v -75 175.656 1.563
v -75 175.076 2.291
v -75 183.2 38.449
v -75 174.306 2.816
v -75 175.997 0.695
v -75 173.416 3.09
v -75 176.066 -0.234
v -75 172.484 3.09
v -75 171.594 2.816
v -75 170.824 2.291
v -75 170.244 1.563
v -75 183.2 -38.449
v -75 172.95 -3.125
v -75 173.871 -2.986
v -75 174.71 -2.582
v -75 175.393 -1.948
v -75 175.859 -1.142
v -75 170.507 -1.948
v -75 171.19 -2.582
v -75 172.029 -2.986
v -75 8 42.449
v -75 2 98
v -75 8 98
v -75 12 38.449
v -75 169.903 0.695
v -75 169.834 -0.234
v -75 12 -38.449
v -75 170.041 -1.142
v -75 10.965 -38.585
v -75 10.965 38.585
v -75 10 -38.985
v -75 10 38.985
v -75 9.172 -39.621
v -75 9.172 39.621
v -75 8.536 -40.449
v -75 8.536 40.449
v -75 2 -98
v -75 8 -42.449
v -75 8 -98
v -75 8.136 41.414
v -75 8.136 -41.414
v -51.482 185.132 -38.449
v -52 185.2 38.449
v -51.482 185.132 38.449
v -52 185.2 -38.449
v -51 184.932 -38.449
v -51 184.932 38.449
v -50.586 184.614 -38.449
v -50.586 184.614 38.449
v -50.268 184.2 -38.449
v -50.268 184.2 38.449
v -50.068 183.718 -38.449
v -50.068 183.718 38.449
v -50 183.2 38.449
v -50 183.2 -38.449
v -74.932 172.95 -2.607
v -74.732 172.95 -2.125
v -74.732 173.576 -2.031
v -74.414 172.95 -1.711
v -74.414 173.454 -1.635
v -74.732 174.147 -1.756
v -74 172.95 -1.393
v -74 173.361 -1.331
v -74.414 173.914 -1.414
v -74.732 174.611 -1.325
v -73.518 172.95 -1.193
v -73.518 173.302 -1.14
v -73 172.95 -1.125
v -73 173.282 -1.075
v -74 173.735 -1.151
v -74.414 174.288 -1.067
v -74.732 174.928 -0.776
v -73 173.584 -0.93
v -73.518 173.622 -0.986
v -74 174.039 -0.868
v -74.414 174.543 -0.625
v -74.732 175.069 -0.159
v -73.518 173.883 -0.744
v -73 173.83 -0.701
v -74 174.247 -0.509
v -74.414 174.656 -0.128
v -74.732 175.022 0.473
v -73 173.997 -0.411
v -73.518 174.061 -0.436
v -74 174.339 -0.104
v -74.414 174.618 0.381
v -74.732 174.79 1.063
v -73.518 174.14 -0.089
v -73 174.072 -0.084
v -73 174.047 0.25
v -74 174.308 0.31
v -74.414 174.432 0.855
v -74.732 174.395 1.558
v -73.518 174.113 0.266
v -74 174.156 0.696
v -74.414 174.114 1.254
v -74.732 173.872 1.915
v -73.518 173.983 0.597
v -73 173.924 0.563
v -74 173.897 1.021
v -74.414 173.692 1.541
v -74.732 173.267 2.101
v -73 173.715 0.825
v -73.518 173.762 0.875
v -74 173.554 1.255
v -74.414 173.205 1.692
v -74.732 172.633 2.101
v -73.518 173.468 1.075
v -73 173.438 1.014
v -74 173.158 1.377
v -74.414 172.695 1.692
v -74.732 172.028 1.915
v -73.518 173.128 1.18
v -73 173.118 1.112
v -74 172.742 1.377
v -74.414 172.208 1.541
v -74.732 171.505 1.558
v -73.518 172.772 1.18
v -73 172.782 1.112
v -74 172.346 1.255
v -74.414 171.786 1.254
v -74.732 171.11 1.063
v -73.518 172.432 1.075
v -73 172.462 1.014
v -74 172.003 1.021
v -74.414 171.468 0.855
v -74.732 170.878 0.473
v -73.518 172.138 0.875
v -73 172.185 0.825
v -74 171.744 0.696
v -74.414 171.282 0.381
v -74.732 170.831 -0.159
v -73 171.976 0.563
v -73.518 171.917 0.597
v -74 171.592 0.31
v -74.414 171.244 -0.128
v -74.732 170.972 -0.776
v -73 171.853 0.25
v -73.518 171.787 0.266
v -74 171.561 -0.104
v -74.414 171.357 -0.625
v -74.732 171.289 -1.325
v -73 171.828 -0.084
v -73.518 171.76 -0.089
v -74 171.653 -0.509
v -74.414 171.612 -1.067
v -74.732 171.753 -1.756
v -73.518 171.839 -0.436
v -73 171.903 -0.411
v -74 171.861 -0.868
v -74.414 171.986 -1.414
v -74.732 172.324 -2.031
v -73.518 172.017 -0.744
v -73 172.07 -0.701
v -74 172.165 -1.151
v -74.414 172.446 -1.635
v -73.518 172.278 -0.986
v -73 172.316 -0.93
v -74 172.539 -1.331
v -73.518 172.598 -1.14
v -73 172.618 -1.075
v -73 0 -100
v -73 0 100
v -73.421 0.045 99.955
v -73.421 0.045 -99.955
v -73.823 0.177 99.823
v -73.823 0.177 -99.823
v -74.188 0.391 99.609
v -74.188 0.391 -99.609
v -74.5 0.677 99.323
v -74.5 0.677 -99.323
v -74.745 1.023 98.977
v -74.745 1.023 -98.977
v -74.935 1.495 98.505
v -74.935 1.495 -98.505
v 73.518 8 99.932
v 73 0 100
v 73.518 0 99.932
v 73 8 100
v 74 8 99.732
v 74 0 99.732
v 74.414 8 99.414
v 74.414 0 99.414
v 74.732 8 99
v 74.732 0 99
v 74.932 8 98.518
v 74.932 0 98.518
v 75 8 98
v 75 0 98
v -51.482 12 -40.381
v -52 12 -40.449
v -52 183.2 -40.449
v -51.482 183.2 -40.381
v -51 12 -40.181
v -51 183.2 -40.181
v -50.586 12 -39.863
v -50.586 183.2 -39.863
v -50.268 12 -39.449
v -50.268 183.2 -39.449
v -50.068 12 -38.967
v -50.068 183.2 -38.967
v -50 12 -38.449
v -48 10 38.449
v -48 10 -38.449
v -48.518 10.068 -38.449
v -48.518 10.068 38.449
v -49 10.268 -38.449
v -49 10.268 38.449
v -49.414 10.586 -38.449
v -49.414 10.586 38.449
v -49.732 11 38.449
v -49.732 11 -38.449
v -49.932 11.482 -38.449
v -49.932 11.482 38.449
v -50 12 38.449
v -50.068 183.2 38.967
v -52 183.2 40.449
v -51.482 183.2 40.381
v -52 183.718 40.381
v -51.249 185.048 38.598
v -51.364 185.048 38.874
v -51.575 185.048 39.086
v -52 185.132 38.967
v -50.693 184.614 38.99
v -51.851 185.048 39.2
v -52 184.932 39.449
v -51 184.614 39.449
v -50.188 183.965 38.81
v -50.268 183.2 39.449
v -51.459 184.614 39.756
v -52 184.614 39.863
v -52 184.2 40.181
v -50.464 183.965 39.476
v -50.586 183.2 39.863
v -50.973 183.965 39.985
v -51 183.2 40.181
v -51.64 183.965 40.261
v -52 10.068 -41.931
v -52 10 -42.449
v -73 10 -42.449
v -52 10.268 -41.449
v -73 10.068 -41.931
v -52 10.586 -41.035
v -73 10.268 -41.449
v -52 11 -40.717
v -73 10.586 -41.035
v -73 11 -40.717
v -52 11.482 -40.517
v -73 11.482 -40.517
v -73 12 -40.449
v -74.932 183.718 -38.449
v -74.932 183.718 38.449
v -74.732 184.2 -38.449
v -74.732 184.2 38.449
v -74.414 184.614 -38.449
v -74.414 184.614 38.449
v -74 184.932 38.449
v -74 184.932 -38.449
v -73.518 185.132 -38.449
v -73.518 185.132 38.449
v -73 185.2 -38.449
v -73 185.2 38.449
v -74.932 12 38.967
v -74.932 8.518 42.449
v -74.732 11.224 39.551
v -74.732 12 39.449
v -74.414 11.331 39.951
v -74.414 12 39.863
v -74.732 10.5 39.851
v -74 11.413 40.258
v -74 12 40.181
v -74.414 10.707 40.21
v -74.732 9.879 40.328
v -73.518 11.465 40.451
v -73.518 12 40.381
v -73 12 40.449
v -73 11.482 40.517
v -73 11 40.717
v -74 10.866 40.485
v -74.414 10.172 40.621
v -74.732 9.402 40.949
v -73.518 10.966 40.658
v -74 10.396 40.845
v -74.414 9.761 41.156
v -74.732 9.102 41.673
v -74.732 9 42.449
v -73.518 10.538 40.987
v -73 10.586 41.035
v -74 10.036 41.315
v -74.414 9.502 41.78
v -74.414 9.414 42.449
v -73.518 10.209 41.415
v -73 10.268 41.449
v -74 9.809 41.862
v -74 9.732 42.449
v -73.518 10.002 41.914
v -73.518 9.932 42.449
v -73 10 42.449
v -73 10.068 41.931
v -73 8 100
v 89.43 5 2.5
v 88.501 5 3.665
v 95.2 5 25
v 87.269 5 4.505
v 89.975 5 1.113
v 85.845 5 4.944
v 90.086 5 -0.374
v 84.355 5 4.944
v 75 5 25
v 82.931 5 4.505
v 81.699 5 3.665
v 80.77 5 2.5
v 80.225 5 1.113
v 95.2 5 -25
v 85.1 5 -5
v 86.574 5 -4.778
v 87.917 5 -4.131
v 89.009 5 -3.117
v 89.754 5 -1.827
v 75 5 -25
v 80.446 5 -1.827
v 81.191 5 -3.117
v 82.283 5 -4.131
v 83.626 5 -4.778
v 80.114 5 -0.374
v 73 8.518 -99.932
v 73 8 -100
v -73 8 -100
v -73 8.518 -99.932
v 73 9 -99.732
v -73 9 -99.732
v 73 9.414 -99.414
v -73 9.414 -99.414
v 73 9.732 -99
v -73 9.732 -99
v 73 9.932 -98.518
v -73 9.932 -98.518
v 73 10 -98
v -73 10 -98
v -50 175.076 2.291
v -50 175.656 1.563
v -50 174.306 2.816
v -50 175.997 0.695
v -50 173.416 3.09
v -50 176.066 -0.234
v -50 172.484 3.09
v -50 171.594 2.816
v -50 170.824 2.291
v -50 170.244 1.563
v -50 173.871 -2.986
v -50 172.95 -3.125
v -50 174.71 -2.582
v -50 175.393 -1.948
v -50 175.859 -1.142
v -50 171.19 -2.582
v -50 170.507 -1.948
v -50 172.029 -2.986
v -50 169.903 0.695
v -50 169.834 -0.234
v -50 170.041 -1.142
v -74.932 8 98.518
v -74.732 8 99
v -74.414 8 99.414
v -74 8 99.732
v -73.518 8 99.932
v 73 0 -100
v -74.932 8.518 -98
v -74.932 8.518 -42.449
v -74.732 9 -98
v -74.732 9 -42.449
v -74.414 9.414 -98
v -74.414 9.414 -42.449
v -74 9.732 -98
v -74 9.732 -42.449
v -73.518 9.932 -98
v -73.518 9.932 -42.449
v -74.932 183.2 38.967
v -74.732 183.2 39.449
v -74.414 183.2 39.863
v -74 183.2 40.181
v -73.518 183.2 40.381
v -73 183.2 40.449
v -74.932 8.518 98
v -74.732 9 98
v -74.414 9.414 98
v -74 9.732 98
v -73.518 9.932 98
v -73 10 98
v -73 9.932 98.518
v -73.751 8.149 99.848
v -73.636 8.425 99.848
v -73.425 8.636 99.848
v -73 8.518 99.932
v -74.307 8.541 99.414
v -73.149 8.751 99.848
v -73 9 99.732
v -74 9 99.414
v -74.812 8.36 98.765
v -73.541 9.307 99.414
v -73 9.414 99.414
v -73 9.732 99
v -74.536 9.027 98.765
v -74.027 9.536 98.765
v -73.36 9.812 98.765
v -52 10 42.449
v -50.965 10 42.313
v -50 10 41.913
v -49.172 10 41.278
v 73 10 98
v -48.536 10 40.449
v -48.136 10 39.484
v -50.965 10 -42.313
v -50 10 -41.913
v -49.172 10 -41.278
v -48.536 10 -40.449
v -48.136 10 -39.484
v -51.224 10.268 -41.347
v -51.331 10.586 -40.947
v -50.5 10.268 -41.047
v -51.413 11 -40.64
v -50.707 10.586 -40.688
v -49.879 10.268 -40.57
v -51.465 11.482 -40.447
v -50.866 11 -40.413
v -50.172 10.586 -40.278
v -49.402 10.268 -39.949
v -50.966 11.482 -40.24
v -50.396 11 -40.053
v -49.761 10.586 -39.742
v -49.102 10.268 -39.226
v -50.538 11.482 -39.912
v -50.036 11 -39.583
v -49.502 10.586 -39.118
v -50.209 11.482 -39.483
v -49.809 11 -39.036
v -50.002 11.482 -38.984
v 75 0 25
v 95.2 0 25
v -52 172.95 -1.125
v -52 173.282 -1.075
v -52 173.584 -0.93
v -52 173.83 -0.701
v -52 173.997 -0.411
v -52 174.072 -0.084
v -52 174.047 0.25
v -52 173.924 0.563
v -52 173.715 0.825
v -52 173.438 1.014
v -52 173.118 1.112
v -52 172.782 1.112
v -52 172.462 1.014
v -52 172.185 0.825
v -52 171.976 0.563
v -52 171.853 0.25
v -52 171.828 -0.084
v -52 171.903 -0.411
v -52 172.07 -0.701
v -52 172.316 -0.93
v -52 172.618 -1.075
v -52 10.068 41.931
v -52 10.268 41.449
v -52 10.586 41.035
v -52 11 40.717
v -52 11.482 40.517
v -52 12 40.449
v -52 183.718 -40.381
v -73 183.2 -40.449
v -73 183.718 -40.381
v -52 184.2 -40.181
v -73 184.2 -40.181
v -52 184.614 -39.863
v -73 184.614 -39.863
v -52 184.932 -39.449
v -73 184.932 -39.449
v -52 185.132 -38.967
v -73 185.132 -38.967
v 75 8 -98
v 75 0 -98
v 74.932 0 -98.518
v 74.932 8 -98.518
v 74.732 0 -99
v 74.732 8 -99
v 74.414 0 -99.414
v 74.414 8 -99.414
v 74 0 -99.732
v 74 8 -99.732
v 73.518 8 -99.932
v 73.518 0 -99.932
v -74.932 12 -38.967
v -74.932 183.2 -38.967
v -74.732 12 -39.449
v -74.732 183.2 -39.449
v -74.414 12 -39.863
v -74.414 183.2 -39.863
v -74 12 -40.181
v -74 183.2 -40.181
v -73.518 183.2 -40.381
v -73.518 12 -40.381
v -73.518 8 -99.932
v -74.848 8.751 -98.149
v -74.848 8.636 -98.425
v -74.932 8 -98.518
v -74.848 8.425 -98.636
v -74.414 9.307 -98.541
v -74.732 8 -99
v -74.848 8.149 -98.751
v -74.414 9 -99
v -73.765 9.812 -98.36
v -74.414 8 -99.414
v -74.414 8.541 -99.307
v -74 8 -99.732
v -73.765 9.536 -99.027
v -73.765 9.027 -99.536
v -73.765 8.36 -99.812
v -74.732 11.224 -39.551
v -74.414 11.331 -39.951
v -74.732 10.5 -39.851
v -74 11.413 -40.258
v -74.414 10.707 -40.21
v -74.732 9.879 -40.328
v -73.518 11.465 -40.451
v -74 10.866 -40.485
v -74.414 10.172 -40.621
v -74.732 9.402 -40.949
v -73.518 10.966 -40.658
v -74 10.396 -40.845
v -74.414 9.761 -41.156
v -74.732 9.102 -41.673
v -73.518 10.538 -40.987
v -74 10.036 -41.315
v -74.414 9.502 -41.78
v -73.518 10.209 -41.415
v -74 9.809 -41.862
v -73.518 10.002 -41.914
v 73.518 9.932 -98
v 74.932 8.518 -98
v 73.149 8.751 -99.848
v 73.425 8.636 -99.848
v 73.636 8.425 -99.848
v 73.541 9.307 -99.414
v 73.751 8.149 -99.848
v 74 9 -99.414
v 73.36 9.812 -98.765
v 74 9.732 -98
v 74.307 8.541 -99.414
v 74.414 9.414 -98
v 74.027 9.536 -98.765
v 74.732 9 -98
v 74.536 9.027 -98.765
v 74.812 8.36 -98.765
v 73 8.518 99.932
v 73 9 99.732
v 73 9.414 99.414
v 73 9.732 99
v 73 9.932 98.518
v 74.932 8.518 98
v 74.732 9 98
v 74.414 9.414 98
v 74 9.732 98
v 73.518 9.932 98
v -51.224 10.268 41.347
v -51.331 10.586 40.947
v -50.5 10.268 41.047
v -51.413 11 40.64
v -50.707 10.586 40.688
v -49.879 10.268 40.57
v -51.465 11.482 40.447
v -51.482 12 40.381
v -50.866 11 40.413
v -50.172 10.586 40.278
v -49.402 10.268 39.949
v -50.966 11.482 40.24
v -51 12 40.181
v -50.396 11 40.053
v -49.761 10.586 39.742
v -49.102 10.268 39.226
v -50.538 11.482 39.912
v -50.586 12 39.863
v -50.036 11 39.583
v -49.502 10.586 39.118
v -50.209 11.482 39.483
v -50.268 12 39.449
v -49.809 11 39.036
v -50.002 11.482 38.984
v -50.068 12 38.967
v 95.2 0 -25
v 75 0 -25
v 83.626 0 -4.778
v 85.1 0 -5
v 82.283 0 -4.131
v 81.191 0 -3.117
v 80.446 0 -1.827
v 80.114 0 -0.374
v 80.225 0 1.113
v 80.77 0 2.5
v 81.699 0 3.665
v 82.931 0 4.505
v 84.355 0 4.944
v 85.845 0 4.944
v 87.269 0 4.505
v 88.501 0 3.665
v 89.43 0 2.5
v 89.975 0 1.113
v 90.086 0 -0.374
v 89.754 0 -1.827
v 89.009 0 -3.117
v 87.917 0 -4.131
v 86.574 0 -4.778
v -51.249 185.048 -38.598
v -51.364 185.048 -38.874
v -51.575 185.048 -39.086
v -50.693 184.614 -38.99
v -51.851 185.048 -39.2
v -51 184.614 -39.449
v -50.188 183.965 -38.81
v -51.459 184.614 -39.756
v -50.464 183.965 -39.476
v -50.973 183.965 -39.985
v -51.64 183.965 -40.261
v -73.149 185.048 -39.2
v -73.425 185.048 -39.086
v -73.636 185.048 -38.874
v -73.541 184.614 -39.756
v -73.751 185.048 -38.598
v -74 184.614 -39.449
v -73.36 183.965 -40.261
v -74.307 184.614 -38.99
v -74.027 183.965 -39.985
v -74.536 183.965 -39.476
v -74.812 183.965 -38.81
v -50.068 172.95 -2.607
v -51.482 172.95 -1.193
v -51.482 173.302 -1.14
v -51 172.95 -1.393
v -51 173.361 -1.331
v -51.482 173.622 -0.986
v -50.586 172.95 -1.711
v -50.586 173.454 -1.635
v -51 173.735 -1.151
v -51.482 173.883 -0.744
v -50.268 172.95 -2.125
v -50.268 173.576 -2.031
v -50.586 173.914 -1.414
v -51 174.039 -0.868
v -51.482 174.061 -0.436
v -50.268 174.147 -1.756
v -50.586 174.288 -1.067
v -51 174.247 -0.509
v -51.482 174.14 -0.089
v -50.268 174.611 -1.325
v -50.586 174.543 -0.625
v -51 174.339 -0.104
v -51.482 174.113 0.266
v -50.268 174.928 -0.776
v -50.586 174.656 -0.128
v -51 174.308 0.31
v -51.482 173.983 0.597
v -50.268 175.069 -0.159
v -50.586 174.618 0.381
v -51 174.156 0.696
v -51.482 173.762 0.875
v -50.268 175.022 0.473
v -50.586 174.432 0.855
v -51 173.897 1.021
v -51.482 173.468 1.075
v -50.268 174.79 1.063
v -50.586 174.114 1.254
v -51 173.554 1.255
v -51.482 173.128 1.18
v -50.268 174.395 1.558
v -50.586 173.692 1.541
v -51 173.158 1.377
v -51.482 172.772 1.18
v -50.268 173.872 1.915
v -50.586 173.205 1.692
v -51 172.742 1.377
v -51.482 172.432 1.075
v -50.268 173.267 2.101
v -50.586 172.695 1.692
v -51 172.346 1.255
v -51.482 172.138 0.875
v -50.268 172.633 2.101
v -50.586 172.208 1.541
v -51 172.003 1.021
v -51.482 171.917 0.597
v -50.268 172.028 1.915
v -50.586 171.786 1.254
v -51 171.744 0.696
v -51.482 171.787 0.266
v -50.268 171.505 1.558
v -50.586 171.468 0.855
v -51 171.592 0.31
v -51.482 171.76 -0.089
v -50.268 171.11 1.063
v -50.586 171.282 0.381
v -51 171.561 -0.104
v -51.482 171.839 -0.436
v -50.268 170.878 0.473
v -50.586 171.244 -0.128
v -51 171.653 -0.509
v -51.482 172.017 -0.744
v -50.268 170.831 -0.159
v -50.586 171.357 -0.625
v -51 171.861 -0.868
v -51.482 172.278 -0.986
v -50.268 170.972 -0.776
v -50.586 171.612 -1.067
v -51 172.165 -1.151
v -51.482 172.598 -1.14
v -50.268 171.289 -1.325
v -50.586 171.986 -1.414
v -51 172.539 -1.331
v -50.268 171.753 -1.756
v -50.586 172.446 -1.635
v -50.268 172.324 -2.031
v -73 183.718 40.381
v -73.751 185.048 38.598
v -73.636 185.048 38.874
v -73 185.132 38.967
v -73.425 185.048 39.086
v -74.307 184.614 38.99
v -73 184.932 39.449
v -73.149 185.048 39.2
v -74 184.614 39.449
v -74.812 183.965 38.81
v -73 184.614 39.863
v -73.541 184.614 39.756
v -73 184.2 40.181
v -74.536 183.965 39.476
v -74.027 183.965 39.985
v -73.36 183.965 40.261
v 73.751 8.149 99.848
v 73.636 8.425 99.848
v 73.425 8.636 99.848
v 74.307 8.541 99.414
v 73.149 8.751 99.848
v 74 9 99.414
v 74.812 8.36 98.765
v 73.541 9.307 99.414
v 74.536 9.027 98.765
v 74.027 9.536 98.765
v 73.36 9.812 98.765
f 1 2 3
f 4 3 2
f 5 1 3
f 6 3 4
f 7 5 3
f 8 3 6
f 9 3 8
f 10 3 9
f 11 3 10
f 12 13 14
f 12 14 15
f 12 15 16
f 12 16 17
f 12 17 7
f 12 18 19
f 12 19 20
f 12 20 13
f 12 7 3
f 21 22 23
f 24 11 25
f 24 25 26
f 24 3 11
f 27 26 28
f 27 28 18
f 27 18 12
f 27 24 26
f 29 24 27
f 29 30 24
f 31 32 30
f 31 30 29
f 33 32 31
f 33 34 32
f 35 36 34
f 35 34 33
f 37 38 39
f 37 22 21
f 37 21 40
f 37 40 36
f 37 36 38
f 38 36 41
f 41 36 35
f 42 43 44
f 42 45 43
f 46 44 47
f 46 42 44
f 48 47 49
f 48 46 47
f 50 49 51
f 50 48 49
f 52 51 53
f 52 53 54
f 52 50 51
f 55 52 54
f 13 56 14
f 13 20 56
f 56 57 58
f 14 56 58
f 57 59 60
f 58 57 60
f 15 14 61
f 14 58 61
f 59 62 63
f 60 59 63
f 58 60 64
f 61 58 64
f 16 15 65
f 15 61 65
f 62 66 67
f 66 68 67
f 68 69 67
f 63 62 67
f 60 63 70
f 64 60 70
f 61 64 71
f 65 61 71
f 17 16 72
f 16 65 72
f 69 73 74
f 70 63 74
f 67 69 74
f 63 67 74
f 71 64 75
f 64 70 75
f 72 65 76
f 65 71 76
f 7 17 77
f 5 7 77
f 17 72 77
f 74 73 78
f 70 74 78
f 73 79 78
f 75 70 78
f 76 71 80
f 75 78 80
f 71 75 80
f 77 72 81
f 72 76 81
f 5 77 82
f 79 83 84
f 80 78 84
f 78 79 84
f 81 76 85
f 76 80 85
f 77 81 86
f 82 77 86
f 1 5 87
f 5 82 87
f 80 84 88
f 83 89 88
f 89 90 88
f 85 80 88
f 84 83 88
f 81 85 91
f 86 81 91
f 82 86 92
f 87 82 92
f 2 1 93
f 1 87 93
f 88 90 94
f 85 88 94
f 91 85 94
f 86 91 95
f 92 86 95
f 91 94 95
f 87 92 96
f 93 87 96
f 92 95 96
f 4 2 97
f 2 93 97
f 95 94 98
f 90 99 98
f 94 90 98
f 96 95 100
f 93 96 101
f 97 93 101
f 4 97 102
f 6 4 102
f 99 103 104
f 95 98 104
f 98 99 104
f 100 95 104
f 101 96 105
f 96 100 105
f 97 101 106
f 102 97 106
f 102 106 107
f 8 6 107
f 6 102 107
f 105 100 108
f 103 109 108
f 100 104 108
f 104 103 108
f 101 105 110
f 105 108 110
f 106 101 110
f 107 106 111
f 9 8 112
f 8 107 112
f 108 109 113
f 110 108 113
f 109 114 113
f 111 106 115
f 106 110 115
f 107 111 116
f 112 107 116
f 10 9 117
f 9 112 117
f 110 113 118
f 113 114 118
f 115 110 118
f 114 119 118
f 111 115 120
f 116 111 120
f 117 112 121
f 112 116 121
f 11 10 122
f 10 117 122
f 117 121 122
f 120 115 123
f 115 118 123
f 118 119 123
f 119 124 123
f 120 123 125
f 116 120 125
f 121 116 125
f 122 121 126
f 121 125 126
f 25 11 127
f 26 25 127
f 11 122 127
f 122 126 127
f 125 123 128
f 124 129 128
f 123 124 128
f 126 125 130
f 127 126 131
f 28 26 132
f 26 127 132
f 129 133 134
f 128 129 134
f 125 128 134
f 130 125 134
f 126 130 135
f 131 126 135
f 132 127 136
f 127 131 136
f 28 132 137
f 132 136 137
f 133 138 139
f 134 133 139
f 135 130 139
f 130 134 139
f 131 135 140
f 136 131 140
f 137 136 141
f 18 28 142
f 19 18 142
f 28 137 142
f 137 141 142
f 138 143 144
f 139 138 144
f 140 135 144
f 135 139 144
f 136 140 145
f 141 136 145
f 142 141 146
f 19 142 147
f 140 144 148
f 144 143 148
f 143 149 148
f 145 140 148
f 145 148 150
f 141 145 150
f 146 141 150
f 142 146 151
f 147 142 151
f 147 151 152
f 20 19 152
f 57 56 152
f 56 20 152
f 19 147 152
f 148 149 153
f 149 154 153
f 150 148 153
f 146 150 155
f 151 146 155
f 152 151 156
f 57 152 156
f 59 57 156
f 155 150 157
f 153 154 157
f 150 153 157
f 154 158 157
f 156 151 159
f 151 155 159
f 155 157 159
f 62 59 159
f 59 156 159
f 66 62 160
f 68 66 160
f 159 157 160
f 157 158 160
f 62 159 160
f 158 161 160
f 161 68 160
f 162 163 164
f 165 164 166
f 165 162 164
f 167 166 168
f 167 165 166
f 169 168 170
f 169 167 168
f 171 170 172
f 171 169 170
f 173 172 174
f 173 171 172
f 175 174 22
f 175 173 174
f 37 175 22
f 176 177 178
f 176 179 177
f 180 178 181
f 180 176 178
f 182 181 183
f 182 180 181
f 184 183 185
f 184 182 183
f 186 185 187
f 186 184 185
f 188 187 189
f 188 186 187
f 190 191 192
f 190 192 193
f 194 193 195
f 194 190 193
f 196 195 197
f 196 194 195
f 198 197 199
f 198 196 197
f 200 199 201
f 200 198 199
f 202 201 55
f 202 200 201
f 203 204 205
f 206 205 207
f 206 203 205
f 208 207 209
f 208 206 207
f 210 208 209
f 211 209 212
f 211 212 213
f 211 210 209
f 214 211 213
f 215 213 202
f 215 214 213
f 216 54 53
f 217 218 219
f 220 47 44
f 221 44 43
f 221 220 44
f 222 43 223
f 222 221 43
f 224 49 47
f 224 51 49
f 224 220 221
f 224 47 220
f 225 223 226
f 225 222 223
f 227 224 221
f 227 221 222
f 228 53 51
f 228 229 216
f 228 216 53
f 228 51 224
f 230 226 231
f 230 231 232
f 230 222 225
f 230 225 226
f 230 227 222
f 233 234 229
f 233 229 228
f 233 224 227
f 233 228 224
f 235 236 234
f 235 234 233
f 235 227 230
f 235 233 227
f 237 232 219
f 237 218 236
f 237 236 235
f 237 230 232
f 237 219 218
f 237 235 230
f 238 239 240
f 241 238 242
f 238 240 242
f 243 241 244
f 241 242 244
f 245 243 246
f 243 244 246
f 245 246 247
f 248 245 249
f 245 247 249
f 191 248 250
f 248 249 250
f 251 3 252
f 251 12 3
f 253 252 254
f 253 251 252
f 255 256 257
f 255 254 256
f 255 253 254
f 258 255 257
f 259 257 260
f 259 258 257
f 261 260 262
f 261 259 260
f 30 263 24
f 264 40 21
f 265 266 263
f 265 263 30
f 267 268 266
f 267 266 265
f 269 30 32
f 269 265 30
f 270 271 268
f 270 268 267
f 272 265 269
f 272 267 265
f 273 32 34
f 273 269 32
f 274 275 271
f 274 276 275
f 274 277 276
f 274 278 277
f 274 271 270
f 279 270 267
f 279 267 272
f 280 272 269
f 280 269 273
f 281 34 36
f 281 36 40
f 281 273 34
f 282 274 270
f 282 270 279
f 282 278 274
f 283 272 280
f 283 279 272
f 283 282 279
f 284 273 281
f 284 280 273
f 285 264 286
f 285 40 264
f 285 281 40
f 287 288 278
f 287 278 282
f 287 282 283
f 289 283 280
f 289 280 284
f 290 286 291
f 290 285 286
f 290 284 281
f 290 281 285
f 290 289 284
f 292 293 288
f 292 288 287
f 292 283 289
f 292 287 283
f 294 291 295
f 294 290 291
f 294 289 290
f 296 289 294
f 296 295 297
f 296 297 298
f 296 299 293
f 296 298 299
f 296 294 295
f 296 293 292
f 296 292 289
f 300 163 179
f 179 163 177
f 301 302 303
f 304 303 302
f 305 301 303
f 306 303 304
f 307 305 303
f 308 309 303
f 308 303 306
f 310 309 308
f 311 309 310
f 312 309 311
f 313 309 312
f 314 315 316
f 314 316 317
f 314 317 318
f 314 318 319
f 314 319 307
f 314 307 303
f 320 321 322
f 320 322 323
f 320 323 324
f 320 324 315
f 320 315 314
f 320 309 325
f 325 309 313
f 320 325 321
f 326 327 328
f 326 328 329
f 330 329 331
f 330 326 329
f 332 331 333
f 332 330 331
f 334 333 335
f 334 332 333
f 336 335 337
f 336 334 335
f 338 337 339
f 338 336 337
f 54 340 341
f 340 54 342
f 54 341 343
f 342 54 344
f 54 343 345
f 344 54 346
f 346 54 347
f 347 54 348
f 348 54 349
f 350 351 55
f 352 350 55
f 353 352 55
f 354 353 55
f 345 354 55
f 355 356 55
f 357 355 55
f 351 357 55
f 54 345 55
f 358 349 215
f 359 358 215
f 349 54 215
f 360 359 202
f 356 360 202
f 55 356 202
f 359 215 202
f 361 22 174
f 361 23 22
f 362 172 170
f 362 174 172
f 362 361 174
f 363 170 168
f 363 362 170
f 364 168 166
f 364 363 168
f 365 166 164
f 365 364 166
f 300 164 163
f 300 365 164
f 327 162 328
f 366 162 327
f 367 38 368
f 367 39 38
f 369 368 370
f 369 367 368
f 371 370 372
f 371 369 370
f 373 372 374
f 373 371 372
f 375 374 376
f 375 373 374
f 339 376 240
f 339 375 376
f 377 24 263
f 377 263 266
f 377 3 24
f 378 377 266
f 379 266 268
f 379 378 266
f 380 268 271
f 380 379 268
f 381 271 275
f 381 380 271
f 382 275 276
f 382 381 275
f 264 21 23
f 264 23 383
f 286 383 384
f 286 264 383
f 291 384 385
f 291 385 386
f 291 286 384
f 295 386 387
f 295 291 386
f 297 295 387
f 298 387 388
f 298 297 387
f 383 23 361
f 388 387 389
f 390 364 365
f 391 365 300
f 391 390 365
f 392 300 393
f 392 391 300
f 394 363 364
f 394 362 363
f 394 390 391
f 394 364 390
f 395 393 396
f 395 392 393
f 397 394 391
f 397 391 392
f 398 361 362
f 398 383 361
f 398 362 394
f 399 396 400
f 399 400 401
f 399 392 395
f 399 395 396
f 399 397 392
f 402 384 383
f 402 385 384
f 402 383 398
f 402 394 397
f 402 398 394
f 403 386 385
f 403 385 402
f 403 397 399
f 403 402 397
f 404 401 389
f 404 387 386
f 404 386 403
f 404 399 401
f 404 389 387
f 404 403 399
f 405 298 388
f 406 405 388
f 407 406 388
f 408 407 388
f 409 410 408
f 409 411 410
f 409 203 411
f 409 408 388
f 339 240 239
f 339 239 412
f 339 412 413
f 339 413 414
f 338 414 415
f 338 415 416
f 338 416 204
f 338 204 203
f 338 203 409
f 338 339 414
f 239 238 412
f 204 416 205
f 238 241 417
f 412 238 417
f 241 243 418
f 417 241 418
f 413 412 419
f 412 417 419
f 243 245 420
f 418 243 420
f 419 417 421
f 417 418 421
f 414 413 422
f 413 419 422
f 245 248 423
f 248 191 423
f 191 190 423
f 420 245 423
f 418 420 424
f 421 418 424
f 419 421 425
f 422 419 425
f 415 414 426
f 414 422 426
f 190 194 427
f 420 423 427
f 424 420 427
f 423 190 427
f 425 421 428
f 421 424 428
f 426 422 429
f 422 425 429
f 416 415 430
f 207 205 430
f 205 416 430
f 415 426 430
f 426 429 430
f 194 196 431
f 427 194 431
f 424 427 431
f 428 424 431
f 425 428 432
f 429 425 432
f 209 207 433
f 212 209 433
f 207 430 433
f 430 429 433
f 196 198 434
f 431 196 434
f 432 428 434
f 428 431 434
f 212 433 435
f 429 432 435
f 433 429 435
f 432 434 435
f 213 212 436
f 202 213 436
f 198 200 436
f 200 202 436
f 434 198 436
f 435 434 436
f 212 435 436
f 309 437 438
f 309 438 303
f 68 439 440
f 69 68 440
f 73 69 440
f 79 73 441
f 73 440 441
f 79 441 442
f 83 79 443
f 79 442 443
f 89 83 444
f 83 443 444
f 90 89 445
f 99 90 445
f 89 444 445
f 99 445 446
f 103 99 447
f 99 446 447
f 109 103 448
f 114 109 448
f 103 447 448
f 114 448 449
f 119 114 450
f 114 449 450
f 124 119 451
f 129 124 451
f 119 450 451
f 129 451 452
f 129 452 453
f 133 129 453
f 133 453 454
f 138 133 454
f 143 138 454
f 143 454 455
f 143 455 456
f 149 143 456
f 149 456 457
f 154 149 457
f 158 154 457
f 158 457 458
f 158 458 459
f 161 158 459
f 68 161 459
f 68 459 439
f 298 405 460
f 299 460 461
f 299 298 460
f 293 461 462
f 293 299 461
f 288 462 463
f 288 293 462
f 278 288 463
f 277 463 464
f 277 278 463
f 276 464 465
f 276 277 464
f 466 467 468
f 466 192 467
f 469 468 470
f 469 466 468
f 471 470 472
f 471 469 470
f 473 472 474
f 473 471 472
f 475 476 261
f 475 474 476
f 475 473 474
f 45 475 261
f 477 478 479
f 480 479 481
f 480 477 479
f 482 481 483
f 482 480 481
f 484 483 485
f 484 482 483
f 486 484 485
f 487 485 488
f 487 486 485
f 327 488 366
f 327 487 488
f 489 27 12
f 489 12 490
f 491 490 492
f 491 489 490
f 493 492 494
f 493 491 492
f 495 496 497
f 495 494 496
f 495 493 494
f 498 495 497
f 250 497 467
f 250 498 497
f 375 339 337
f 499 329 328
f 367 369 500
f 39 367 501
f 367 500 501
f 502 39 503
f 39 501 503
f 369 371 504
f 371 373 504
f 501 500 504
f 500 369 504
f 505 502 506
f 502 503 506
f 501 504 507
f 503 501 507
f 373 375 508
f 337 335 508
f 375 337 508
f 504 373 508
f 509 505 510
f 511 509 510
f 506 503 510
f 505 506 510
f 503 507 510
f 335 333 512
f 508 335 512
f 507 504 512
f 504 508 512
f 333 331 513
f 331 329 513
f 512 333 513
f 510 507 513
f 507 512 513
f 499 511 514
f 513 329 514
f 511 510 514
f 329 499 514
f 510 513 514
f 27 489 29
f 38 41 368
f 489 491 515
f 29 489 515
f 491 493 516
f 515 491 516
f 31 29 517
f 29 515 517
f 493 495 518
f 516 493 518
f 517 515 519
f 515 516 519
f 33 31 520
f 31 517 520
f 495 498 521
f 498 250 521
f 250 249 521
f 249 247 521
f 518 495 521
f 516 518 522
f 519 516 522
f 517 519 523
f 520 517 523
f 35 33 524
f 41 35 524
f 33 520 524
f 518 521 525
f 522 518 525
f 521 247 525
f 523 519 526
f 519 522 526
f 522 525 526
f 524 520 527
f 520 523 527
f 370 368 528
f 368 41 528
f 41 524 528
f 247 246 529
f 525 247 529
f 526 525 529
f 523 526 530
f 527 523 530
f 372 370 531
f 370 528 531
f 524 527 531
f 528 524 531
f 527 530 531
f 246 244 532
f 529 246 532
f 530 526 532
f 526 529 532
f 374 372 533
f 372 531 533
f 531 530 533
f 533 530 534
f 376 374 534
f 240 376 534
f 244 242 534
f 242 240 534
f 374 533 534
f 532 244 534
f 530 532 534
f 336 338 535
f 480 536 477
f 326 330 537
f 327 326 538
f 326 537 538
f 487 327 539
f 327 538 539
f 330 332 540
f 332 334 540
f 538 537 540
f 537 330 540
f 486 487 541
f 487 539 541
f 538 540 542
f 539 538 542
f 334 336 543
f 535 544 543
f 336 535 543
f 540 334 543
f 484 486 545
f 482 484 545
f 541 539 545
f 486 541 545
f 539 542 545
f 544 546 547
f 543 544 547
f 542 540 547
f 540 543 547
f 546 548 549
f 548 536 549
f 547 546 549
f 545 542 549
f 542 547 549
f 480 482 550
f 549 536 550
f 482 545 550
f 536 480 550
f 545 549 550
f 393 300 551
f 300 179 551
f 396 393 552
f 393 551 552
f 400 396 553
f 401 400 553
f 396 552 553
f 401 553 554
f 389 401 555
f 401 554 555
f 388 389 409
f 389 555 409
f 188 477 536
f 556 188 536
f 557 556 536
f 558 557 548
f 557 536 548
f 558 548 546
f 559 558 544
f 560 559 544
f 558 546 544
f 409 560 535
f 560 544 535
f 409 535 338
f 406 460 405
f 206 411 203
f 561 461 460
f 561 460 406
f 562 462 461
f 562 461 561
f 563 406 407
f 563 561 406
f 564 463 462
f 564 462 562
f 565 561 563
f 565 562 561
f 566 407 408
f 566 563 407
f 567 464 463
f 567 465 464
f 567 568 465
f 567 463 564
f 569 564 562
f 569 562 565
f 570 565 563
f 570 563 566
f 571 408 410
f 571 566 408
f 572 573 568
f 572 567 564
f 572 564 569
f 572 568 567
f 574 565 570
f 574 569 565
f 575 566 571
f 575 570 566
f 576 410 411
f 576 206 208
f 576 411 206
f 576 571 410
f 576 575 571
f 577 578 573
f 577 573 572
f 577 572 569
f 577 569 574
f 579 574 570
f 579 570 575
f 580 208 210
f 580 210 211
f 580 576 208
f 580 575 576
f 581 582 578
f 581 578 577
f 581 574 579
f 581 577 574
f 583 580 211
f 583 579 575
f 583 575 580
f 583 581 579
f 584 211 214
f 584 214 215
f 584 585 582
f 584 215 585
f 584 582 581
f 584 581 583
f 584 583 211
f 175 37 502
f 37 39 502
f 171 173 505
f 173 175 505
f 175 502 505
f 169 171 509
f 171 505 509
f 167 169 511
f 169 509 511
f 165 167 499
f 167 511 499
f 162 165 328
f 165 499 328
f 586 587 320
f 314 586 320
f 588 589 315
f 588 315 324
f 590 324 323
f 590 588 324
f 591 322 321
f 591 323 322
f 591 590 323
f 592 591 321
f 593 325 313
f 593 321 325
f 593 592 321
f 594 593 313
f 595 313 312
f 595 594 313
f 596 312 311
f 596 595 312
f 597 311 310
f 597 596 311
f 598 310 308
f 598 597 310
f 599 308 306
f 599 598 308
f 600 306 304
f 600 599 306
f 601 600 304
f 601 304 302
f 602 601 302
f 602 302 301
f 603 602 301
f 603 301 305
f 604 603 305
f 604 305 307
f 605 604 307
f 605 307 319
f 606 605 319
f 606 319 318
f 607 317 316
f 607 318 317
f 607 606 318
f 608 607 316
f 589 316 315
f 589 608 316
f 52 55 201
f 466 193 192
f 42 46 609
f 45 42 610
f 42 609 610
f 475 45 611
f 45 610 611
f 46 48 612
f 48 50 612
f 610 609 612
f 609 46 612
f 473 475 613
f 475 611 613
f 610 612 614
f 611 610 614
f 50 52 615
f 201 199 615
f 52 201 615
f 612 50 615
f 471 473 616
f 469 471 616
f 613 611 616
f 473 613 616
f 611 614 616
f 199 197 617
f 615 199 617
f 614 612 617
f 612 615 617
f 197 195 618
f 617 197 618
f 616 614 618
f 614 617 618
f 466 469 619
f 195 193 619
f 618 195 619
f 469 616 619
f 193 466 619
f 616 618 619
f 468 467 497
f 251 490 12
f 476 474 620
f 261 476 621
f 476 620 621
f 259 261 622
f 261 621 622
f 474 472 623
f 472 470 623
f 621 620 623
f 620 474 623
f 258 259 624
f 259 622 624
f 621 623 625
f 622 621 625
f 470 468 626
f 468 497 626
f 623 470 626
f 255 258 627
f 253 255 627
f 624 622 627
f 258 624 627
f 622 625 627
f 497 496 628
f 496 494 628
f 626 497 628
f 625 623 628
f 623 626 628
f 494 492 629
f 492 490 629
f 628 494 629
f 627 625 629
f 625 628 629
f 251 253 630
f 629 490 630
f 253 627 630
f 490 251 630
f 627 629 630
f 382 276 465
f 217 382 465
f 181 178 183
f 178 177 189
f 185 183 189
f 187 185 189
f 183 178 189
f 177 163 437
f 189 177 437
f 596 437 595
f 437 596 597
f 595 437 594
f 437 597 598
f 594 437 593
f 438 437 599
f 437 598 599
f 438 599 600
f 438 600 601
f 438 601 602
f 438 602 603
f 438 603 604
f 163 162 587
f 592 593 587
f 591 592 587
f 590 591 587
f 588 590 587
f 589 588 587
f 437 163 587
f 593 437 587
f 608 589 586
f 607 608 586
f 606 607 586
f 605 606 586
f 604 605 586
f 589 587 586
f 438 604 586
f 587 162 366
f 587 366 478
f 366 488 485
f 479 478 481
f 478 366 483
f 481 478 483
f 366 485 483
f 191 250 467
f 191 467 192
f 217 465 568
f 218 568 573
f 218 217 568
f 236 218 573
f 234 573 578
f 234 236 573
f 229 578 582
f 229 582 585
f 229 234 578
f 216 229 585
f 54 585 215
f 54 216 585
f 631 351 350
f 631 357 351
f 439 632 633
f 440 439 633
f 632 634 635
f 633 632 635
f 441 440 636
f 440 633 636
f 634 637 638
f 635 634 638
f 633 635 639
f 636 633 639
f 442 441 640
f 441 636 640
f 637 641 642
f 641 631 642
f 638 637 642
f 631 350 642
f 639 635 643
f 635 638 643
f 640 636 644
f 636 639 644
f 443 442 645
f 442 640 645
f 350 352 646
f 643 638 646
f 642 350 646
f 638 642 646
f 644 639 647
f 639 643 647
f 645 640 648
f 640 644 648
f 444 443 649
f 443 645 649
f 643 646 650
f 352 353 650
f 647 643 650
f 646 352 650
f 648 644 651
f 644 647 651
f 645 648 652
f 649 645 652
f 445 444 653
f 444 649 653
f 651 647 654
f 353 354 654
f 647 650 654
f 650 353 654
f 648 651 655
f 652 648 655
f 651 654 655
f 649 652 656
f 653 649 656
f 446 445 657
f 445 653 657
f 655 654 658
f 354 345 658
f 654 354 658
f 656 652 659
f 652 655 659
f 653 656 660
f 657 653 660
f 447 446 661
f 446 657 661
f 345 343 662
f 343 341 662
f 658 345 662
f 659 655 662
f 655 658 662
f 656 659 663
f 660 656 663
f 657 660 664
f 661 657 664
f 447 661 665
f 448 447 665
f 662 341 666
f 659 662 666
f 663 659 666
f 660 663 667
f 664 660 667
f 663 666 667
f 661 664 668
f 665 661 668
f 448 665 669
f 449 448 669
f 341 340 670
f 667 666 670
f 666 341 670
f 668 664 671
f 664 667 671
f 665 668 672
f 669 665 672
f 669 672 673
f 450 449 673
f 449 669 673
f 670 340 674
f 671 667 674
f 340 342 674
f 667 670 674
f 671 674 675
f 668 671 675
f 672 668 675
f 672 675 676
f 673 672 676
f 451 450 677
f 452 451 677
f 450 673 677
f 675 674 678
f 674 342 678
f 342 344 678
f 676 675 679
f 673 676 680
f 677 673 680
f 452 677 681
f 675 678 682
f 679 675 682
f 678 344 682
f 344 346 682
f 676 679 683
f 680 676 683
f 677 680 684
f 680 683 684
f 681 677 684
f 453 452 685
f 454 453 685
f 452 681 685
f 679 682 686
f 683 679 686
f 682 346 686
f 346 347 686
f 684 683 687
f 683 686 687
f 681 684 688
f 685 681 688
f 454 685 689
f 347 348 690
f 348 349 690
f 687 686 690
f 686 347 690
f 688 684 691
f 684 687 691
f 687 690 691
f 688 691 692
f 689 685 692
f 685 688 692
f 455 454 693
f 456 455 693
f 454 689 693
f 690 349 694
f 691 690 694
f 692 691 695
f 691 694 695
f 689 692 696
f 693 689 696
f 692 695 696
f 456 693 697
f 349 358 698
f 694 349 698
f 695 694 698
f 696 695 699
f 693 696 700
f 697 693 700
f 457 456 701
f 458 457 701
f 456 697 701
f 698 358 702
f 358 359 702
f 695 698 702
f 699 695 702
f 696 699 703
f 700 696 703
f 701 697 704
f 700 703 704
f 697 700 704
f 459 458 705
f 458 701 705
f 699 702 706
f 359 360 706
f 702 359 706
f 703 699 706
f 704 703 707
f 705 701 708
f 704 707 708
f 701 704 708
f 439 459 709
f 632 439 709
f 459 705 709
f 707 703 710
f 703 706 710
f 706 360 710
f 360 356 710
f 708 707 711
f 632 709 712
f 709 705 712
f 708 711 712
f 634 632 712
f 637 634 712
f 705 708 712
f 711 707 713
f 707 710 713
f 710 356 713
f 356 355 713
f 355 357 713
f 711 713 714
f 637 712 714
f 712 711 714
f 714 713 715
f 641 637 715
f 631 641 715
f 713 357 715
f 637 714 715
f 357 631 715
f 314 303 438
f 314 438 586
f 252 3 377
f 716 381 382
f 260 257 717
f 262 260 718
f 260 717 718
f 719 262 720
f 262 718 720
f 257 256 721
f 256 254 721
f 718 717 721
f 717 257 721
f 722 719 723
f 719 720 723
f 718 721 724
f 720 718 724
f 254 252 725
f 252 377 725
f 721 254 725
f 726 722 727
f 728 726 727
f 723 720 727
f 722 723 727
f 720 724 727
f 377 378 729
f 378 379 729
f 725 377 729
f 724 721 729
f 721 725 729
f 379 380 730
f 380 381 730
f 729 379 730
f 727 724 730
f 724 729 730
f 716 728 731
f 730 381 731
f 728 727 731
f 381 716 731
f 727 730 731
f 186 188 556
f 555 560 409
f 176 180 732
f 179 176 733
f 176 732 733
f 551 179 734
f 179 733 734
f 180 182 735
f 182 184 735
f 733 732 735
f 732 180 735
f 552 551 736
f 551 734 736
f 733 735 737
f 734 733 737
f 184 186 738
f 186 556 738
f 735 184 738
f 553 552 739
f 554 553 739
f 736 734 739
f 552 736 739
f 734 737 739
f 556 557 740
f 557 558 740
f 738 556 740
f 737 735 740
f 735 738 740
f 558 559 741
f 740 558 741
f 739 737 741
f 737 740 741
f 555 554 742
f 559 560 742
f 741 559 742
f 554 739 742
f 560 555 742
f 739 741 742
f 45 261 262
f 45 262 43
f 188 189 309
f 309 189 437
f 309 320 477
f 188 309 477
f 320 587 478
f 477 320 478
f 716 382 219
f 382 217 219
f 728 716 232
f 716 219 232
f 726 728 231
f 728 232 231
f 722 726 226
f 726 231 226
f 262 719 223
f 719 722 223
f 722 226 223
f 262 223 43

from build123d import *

# Parameters (mm, degrees)
ESQUISSE2_W                  = 150
ESQUISSE2_H                  = 200
BOSS_EXTRU_2_DEPTH           = 10
ESQUISSE3_W                  = 25
ESQUISSE3_H                  = 80.898254602
BOSS_EXTRU_3_DEPTH           = 165
ESQUISSE7_W                  = 50
ESQUISSE7_H                  = 5
BOSS_EXTRU_4_DEPTH           = 95.2
ENL_V_MAT_EXTRU_2_DEPTH      = 95.2
ENL_V_MAT_EXTRU_2_DEPTH_BACK = 95.2
ESQUISSE8_R                  = 5
ESQUISSE9_W                  = 25
ESQUISSE9_H                  = 80.898254602
BOSS_EXTRU_5_DEPTH           = 185.2
ESQUISSE10_R                 = 1.125
ENL_V_MAT_EXTRU_3_DEPTH      = 185.2
CONG_1_R                     = 2


with BuildPart() as part:
    # Esquisse2 → Boss.-Extru.2 (new body)
    with BuildSketch(Plane(origin=(0, 0, 0), x_dir=(1, 0, 0), z_dir=(0, 1, 0))):
        Rectangle(ESQUISSE2_W, ESQUISSE2_H)
    extrude(amount=BOSS_EXTRU_2_DEPTH)

    # Esquisse3 → Boss.-Extru.3 (add)
    with BuildSketch(Plane(origin=(0, 0, 0), x_dir=(1, 0, 0), z_dir=(0, 1, 0))):
        with Locations((-62.5, 0)):
            Rectangle(ESQUISSE3_W, ESQUISSE3_H)
    extrude(amount=BOSS_EXTRU_3_DEPTH)

    # Esquisse7 → Boss.-Extru.4 (add)
    with BuildSketch(Plane(origin=(0, 0, 0), x_dir=(0, 0, -1), z_dir=(1, 0, 0))):
        with Locations((0, 2.5)):
            Rectangle(ESQUISSE7_W, ESQUISSE7_H)
    extrude(amount=BOSS_EXTRU_4_DEPTH)

    # Esquisse8 → Enlèv. mat.-Extru.2 (cut, two sides: drawn at the far end of the back side and taken through both)
    with BuildSketch(Plane(origin=(0, 0, 0), x_dir=(1, 0, 0), z_dir=(0, 1, 0)).offset(-ENL_V_MAT_EXTRU_2_DEPTH_BACK)):
        with Locations(Location((85.1, 0, 0), (0, 0, 90))):
            Circle(ESQUISSE8_R)
    extrude(amount=ENL_V_MAT_EXTRU_2_DEPTH + ENL_V_MAT_EXTRU_2_DEPTH_BACK, mode=Mode.SUBTRACT)

    # Esquisse9 → Boss.-Extru.5 (add)
    with BuildSketch(Plane(origin=(0, 0, 0), x_dir=(1, 0, 0), z_dir=(0, 1, 0))):
        with Locations((-62.5, 0)):
            Rectangle(ESQUISSE9_W, ESQUISSE9_H)
    extrude(amount=BOSS_EXTRU_5_DEPTH)

    # Esquisse10 → Enlèv. mat.-Extru.3 (cut)
    with BuildSketch(Plane(origin=(0, 0, 0), x_dir=(0, 0, -1), z_dir=(1, 0, 0))):
        with Locations((0, 172.95)):
            Circle(ESQUISSE10_R)
    extrude(amount=-ENL_V_MAT_EXTRU_3_DEPTH, mode=Mode.SUBTRACT)

    # Congé1
    cong_1_edges = [part.edges().sort_by_distance(p)[0] for p in [
        (75, 10, 0),
        (-75, 10, 70.224563651),
        (0, 10, -100),
        (-62.5, 10, -40.449127301),
        (-62.5, 10, 40.449127301),
        (-50, 10, 0),
        (-50, 97.6, -40.449127301),
        (-75, 97.6, -40.449127301),
        (-75, 97.6, 40.449127301),
        (-50, 97.6, 40.449127301),
        (-75, 10, -70.224563651),
        (-75, 0, 0),
        (-50, 185.2, 0),
        (-62.5, 185.2, -40.449127301),
        (-75, 185.2, 0),
        (-62.5, 185.2, 40.449127301),
        (-75, 5, -100),
        (75, 5, -100),
        (75, 5, 100),
        (-75, 5, 100),
        (-50, 172.95, 1.125),
        (-75, 172.95, 1.125),
        (0, 10, 100),
    ]]
    fillet(cong_1_edges, radius=CONG_1_R)


solid = part.part
